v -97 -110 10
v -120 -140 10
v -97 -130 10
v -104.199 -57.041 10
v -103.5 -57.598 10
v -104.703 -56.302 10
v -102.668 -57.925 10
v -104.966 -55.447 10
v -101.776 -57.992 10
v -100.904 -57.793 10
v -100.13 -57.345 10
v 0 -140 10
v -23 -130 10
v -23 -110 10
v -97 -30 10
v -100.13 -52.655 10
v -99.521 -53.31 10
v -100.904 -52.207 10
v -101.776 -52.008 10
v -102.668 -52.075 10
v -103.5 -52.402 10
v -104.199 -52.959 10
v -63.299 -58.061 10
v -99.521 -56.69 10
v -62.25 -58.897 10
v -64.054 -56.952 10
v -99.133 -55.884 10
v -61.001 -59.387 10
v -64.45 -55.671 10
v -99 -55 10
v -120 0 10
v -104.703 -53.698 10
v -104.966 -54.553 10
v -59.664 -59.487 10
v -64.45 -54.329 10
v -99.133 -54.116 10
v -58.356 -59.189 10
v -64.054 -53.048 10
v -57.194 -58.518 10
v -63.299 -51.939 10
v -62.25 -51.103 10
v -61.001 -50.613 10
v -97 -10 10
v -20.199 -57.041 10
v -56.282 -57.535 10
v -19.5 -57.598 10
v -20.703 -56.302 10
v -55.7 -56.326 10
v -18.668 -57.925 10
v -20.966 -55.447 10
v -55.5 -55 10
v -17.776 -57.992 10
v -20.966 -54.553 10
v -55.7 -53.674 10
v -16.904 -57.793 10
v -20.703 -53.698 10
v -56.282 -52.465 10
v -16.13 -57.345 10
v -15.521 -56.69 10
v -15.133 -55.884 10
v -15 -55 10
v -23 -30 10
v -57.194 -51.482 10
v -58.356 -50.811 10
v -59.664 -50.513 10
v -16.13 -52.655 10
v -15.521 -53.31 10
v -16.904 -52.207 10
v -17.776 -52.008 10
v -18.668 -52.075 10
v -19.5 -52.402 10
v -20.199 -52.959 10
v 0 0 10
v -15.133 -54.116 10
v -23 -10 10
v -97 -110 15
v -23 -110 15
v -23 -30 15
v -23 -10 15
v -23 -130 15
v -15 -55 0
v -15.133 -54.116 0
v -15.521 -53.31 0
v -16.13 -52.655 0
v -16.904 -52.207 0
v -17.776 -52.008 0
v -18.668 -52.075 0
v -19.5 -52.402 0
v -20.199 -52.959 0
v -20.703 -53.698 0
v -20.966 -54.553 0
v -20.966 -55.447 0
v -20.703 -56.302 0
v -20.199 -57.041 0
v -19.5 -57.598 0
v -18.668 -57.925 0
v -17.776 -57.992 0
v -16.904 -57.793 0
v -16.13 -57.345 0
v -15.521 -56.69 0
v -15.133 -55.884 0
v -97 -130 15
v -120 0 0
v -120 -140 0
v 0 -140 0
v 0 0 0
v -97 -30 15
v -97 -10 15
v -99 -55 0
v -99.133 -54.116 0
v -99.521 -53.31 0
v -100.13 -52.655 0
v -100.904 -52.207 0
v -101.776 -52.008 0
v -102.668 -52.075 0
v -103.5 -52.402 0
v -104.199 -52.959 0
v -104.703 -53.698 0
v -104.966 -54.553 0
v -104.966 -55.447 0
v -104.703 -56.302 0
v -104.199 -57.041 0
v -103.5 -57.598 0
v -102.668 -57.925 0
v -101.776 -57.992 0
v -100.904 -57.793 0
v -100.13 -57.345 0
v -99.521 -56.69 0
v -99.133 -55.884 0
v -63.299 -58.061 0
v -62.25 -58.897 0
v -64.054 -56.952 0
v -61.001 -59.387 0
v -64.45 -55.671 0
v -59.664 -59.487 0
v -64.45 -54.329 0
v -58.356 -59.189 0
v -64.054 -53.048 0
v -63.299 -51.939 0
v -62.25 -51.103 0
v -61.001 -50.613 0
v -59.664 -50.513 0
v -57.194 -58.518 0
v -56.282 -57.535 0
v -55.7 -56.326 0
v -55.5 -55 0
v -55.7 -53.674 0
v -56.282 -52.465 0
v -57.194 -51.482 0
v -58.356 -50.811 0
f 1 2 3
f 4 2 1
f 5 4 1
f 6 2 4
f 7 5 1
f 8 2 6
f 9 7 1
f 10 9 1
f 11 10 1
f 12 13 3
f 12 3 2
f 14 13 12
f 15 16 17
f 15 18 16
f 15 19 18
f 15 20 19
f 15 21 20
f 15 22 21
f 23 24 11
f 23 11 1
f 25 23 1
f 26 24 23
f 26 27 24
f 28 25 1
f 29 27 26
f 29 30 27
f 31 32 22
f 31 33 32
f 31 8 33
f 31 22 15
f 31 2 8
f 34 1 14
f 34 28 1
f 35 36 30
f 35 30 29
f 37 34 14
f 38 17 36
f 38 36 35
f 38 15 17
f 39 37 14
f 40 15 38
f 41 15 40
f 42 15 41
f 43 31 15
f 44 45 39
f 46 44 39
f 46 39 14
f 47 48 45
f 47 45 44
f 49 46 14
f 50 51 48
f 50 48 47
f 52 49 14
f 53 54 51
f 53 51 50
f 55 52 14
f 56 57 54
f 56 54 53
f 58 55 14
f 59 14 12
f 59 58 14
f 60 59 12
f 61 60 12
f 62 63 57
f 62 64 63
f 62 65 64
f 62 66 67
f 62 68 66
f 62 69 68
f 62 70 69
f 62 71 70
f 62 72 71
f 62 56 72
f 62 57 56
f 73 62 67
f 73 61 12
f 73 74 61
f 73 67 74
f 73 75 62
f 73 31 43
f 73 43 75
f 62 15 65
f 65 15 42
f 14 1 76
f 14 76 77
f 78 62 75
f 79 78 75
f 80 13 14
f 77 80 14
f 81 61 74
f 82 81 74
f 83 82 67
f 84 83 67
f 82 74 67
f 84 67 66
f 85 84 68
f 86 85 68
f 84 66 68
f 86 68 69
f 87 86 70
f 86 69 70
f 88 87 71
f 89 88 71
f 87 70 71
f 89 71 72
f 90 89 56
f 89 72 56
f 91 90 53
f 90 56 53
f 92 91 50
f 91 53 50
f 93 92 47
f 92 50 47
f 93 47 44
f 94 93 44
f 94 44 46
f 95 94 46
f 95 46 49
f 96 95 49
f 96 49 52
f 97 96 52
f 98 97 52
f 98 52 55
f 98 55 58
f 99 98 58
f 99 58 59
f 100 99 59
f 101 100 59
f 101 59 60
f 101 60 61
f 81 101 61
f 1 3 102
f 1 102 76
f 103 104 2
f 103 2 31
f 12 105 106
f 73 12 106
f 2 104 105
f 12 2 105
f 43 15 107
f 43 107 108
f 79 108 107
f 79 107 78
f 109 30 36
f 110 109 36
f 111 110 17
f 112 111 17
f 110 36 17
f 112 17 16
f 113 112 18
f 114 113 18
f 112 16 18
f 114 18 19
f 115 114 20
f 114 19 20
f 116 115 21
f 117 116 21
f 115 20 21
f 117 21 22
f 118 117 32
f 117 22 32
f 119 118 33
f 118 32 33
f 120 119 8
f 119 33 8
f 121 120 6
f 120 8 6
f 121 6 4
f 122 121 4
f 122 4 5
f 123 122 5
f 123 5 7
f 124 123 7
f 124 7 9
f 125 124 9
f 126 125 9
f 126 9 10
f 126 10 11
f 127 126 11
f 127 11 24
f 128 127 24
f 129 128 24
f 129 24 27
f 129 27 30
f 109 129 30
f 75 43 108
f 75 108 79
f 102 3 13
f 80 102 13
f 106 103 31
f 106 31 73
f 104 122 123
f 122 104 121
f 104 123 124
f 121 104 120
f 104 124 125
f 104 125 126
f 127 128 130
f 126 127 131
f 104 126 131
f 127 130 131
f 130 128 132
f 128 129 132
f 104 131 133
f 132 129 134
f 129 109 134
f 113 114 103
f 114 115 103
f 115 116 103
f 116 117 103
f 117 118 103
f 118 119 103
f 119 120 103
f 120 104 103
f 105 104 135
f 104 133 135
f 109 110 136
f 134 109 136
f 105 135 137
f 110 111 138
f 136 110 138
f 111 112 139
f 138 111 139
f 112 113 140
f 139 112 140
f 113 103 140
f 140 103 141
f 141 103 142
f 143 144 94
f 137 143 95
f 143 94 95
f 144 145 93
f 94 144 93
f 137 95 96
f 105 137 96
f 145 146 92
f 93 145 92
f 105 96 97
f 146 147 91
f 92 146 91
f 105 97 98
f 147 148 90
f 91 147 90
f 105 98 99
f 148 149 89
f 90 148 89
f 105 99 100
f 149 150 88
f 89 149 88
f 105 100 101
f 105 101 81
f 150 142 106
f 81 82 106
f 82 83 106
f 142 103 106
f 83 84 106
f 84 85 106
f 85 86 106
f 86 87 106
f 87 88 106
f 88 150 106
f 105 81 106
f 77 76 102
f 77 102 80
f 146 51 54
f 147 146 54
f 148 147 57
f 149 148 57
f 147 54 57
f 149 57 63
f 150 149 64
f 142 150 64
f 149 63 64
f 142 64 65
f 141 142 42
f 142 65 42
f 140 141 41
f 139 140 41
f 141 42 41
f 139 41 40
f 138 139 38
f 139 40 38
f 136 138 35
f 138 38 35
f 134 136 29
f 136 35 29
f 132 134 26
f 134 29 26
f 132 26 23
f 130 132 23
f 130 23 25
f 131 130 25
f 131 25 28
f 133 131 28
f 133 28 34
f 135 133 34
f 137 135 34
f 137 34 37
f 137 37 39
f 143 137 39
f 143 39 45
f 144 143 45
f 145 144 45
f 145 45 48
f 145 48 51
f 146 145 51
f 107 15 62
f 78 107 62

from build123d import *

# Parameters (mm, degrees)
SKETCH1_W           = 120
SKETCH1_H           = 140
BOSS_EXTRUDE1_DEPTH = 10
SKETCH2_W           = 74
SKETCH2_H           = 20
BOSS_EXTRUDE2_DEPTH = 5
SKETCH4_R           = 3
SKETCH4_R_2         = 4.5
CUT_EXTRUDE1_DEPTH  = 15


with BuildPart() as part:
    # Sketch1 → Boss-Extrude1 (new body)
    with BuildSketch(Plane.XY):
        with Locations((-60, -70)):
            Rectangle(SKETCH1_W, SKETCH1_H)
    extrude(amount=BOSS_EXTRUDE1_DEPTH)

    # Sketch2 → Boss-Extrude2 (add)
    with BuildSketch(Plane.XY.offset(10)):
        with Locations((-60, -20)):
            Rectangle(SKETCH2_W, SKETCH2_H)
        with Locations((-60, -120)):
            Rectangle(SKETCH2_W, SKETCH2_H)
    extrude(amount=BOSS_EXTRUDE2_DEPTH)

    # Sketch4 → Cut-Extrude1 (cut)
    with BuildSketch(Plane.XY.offset(15)):
        with Locations((-102, -55)):
            Circle(SKETCH4_R)
        with Locations((-60, -55)):
            Circle(SKETCH4_R_2)
        with Locations((-18, -55)):
            Circle(SKETCH4_R)
    extrude(amount=-CUT_EXTRUDE1_DEPTH, mode=Mode.SUBTRACT)


solid = part.part
